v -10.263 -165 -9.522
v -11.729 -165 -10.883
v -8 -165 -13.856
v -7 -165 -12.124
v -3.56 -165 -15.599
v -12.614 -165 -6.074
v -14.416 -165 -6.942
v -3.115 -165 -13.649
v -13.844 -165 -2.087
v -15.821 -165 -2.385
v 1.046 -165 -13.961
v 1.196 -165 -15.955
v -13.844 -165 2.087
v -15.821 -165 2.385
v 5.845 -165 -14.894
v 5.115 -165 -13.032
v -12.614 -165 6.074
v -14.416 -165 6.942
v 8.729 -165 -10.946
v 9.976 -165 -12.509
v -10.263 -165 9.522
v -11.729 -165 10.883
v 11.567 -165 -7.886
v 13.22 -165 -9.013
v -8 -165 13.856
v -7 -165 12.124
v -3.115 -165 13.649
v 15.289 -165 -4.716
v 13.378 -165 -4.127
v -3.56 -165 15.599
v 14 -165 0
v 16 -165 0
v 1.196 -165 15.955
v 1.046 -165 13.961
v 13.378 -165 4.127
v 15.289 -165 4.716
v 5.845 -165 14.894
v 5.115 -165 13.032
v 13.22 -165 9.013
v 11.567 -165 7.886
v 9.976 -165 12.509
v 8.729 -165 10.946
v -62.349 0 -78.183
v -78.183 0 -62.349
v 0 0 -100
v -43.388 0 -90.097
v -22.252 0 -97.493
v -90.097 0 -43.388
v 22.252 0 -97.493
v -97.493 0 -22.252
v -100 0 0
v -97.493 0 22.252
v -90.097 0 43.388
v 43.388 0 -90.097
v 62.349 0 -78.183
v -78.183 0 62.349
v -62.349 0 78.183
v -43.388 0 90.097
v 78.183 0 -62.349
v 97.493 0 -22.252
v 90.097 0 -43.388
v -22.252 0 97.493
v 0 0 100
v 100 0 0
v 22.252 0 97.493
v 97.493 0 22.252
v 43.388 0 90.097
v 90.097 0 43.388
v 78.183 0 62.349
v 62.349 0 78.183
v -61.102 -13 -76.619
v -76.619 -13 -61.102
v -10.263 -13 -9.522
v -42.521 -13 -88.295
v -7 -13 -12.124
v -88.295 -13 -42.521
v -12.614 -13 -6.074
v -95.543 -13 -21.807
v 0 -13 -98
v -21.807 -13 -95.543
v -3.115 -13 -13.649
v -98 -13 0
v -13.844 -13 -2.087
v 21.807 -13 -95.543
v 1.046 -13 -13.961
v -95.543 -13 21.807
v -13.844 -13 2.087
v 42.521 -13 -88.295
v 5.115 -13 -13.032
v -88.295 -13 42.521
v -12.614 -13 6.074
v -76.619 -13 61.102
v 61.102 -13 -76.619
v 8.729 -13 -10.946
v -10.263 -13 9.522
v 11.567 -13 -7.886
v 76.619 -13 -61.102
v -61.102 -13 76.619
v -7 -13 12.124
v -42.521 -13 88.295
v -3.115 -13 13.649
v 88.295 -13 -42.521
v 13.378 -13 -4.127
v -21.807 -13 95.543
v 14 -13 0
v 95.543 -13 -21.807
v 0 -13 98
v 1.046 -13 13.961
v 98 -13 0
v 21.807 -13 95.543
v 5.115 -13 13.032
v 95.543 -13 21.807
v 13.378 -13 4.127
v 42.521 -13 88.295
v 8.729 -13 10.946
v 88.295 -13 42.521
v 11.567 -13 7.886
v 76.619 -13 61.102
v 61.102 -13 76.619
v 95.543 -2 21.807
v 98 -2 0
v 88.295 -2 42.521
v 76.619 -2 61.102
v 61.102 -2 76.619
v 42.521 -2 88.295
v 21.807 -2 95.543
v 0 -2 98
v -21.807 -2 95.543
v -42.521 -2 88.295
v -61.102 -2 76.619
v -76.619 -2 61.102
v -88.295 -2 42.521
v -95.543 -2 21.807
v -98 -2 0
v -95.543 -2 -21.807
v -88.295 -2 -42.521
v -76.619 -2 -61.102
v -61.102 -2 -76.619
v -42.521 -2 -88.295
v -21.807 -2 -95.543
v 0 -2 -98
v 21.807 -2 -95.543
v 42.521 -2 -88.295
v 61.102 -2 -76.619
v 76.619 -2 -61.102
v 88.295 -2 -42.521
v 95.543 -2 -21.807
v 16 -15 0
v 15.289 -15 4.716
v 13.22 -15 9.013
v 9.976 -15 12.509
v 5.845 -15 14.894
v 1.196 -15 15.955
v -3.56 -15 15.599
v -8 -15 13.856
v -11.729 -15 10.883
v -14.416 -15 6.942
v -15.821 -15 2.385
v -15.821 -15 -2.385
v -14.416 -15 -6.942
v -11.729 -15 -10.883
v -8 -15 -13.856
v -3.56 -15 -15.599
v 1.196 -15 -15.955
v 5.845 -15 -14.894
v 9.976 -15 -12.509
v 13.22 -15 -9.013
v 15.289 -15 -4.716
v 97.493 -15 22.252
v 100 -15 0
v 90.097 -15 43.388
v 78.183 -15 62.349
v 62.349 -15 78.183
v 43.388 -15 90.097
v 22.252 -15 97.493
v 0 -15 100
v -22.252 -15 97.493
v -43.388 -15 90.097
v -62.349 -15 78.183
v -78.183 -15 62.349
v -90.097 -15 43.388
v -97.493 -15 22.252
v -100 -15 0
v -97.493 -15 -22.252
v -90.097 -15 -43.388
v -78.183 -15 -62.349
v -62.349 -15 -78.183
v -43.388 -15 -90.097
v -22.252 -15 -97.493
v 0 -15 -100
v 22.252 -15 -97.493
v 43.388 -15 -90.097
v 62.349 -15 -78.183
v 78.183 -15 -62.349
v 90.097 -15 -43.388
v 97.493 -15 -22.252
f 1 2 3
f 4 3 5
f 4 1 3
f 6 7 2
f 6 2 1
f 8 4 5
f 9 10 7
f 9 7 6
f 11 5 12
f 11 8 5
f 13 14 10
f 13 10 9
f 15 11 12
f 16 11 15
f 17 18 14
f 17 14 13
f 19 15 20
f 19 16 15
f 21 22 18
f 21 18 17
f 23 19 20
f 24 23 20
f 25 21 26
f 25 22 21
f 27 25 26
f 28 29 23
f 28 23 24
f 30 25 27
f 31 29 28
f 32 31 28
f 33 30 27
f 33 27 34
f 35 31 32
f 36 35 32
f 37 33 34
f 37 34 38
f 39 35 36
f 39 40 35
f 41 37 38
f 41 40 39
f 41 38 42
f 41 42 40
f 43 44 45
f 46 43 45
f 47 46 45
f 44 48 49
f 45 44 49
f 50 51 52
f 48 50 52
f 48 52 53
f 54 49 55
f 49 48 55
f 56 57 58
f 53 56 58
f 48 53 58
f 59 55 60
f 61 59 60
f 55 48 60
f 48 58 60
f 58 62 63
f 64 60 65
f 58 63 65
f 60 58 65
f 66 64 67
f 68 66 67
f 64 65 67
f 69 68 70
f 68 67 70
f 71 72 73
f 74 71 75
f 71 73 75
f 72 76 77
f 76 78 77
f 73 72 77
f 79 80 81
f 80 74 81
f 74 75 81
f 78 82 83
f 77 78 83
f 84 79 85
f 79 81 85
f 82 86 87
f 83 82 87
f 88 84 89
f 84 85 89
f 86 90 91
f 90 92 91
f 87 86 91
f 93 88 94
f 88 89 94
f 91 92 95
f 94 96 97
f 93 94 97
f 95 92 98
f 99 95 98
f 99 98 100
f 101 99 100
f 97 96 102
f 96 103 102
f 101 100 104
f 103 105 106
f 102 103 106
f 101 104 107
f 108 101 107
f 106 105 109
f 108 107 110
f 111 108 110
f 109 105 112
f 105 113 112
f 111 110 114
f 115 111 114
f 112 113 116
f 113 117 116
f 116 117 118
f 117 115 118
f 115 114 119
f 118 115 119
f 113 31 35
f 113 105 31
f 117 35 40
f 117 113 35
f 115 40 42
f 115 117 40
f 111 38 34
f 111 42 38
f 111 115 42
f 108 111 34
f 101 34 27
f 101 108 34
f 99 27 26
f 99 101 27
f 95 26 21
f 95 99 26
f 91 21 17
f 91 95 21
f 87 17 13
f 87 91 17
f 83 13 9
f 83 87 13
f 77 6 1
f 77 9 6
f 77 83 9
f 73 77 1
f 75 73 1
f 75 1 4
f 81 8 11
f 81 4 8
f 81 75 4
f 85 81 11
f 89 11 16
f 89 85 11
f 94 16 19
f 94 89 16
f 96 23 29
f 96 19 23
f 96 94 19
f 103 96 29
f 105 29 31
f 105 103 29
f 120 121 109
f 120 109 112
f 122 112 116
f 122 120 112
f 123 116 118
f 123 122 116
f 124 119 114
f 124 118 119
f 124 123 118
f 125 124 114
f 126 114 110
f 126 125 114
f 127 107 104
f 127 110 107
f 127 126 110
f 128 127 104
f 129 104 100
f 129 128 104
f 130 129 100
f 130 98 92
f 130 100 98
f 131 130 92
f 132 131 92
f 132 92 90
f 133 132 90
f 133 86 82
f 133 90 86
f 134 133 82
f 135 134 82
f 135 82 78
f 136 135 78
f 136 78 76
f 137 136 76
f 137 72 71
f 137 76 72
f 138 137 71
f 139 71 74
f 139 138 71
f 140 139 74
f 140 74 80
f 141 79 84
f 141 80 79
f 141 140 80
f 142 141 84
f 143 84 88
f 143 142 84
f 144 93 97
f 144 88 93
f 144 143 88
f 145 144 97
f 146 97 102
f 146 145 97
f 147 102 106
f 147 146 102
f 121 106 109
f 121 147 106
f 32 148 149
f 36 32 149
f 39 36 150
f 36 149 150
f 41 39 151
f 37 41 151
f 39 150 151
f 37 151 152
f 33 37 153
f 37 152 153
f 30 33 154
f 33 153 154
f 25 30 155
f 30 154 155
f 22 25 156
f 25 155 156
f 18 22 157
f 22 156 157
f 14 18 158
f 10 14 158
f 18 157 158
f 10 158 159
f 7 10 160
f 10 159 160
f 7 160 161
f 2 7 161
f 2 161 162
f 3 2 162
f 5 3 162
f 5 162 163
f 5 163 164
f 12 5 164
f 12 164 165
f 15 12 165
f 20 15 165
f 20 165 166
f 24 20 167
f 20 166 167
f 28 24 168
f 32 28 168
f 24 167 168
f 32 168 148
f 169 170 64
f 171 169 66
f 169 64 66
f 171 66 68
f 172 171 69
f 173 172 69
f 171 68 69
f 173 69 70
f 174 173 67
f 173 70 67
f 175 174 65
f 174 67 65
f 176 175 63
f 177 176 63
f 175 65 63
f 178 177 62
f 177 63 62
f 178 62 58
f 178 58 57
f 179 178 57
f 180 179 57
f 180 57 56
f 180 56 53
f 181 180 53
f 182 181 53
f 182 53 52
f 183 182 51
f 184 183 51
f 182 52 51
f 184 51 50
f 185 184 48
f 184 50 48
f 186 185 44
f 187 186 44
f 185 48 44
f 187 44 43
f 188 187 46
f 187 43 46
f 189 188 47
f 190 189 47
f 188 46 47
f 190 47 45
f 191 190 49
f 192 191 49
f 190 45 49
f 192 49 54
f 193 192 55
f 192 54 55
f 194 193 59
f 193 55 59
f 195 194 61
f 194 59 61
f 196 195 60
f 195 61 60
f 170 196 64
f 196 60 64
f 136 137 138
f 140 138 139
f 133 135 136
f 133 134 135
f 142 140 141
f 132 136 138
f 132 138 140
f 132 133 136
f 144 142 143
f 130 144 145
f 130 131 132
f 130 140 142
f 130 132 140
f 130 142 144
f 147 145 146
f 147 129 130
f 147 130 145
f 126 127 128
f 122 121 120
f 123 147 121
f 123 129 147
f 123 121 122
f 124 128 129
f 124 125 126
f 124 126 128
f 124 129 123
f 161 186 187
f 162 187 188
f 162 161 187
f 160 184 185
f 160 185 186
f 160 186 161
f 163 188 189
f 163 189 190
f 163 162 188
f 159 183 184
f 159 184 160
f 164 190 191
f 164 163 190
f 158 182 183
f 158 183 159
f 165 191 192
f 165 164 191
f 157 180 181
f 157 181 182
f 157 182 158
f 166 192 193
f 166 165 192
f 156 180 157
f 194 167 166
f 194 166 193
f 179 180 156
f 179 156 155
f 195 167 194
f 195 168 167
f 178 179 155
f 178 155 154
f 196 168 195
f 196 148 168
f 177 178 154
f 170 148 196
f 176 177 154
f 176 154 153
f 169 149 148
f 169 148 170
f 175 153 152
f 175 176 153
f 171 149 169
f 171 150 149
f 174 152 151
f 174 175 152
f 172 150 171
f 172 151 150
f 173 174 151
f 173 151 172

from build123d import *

# Parameters (mm, degrees)
F0_R     = 100
F1_DEPTH = 15
F2_R     = 16
F3_DEPTH = 150
F4_T     = -2


with BuildPart() as f1:
    # F0 (on Front) → F1 (new body)
    with BuildSketch(Plane.XZ):
        Circle(F0_R)
    extrude(amount=F1_DEPTH)

    # F2 (on face) → F3 (join)
    with BuildSketch(Plane.XZ.offset(15)):
        Circle(F2_R)
    extrude(amount=F3_DEPTH)

    # F4
    f4_openings = [f1.faces().sort_by_distance(p)[0] for p in [
        (0, -165, 0),
    ]]
    offset(amount=F4_T, openings=f4_openings, kind=Kind.INTERSECTION)


solid = f1.part
